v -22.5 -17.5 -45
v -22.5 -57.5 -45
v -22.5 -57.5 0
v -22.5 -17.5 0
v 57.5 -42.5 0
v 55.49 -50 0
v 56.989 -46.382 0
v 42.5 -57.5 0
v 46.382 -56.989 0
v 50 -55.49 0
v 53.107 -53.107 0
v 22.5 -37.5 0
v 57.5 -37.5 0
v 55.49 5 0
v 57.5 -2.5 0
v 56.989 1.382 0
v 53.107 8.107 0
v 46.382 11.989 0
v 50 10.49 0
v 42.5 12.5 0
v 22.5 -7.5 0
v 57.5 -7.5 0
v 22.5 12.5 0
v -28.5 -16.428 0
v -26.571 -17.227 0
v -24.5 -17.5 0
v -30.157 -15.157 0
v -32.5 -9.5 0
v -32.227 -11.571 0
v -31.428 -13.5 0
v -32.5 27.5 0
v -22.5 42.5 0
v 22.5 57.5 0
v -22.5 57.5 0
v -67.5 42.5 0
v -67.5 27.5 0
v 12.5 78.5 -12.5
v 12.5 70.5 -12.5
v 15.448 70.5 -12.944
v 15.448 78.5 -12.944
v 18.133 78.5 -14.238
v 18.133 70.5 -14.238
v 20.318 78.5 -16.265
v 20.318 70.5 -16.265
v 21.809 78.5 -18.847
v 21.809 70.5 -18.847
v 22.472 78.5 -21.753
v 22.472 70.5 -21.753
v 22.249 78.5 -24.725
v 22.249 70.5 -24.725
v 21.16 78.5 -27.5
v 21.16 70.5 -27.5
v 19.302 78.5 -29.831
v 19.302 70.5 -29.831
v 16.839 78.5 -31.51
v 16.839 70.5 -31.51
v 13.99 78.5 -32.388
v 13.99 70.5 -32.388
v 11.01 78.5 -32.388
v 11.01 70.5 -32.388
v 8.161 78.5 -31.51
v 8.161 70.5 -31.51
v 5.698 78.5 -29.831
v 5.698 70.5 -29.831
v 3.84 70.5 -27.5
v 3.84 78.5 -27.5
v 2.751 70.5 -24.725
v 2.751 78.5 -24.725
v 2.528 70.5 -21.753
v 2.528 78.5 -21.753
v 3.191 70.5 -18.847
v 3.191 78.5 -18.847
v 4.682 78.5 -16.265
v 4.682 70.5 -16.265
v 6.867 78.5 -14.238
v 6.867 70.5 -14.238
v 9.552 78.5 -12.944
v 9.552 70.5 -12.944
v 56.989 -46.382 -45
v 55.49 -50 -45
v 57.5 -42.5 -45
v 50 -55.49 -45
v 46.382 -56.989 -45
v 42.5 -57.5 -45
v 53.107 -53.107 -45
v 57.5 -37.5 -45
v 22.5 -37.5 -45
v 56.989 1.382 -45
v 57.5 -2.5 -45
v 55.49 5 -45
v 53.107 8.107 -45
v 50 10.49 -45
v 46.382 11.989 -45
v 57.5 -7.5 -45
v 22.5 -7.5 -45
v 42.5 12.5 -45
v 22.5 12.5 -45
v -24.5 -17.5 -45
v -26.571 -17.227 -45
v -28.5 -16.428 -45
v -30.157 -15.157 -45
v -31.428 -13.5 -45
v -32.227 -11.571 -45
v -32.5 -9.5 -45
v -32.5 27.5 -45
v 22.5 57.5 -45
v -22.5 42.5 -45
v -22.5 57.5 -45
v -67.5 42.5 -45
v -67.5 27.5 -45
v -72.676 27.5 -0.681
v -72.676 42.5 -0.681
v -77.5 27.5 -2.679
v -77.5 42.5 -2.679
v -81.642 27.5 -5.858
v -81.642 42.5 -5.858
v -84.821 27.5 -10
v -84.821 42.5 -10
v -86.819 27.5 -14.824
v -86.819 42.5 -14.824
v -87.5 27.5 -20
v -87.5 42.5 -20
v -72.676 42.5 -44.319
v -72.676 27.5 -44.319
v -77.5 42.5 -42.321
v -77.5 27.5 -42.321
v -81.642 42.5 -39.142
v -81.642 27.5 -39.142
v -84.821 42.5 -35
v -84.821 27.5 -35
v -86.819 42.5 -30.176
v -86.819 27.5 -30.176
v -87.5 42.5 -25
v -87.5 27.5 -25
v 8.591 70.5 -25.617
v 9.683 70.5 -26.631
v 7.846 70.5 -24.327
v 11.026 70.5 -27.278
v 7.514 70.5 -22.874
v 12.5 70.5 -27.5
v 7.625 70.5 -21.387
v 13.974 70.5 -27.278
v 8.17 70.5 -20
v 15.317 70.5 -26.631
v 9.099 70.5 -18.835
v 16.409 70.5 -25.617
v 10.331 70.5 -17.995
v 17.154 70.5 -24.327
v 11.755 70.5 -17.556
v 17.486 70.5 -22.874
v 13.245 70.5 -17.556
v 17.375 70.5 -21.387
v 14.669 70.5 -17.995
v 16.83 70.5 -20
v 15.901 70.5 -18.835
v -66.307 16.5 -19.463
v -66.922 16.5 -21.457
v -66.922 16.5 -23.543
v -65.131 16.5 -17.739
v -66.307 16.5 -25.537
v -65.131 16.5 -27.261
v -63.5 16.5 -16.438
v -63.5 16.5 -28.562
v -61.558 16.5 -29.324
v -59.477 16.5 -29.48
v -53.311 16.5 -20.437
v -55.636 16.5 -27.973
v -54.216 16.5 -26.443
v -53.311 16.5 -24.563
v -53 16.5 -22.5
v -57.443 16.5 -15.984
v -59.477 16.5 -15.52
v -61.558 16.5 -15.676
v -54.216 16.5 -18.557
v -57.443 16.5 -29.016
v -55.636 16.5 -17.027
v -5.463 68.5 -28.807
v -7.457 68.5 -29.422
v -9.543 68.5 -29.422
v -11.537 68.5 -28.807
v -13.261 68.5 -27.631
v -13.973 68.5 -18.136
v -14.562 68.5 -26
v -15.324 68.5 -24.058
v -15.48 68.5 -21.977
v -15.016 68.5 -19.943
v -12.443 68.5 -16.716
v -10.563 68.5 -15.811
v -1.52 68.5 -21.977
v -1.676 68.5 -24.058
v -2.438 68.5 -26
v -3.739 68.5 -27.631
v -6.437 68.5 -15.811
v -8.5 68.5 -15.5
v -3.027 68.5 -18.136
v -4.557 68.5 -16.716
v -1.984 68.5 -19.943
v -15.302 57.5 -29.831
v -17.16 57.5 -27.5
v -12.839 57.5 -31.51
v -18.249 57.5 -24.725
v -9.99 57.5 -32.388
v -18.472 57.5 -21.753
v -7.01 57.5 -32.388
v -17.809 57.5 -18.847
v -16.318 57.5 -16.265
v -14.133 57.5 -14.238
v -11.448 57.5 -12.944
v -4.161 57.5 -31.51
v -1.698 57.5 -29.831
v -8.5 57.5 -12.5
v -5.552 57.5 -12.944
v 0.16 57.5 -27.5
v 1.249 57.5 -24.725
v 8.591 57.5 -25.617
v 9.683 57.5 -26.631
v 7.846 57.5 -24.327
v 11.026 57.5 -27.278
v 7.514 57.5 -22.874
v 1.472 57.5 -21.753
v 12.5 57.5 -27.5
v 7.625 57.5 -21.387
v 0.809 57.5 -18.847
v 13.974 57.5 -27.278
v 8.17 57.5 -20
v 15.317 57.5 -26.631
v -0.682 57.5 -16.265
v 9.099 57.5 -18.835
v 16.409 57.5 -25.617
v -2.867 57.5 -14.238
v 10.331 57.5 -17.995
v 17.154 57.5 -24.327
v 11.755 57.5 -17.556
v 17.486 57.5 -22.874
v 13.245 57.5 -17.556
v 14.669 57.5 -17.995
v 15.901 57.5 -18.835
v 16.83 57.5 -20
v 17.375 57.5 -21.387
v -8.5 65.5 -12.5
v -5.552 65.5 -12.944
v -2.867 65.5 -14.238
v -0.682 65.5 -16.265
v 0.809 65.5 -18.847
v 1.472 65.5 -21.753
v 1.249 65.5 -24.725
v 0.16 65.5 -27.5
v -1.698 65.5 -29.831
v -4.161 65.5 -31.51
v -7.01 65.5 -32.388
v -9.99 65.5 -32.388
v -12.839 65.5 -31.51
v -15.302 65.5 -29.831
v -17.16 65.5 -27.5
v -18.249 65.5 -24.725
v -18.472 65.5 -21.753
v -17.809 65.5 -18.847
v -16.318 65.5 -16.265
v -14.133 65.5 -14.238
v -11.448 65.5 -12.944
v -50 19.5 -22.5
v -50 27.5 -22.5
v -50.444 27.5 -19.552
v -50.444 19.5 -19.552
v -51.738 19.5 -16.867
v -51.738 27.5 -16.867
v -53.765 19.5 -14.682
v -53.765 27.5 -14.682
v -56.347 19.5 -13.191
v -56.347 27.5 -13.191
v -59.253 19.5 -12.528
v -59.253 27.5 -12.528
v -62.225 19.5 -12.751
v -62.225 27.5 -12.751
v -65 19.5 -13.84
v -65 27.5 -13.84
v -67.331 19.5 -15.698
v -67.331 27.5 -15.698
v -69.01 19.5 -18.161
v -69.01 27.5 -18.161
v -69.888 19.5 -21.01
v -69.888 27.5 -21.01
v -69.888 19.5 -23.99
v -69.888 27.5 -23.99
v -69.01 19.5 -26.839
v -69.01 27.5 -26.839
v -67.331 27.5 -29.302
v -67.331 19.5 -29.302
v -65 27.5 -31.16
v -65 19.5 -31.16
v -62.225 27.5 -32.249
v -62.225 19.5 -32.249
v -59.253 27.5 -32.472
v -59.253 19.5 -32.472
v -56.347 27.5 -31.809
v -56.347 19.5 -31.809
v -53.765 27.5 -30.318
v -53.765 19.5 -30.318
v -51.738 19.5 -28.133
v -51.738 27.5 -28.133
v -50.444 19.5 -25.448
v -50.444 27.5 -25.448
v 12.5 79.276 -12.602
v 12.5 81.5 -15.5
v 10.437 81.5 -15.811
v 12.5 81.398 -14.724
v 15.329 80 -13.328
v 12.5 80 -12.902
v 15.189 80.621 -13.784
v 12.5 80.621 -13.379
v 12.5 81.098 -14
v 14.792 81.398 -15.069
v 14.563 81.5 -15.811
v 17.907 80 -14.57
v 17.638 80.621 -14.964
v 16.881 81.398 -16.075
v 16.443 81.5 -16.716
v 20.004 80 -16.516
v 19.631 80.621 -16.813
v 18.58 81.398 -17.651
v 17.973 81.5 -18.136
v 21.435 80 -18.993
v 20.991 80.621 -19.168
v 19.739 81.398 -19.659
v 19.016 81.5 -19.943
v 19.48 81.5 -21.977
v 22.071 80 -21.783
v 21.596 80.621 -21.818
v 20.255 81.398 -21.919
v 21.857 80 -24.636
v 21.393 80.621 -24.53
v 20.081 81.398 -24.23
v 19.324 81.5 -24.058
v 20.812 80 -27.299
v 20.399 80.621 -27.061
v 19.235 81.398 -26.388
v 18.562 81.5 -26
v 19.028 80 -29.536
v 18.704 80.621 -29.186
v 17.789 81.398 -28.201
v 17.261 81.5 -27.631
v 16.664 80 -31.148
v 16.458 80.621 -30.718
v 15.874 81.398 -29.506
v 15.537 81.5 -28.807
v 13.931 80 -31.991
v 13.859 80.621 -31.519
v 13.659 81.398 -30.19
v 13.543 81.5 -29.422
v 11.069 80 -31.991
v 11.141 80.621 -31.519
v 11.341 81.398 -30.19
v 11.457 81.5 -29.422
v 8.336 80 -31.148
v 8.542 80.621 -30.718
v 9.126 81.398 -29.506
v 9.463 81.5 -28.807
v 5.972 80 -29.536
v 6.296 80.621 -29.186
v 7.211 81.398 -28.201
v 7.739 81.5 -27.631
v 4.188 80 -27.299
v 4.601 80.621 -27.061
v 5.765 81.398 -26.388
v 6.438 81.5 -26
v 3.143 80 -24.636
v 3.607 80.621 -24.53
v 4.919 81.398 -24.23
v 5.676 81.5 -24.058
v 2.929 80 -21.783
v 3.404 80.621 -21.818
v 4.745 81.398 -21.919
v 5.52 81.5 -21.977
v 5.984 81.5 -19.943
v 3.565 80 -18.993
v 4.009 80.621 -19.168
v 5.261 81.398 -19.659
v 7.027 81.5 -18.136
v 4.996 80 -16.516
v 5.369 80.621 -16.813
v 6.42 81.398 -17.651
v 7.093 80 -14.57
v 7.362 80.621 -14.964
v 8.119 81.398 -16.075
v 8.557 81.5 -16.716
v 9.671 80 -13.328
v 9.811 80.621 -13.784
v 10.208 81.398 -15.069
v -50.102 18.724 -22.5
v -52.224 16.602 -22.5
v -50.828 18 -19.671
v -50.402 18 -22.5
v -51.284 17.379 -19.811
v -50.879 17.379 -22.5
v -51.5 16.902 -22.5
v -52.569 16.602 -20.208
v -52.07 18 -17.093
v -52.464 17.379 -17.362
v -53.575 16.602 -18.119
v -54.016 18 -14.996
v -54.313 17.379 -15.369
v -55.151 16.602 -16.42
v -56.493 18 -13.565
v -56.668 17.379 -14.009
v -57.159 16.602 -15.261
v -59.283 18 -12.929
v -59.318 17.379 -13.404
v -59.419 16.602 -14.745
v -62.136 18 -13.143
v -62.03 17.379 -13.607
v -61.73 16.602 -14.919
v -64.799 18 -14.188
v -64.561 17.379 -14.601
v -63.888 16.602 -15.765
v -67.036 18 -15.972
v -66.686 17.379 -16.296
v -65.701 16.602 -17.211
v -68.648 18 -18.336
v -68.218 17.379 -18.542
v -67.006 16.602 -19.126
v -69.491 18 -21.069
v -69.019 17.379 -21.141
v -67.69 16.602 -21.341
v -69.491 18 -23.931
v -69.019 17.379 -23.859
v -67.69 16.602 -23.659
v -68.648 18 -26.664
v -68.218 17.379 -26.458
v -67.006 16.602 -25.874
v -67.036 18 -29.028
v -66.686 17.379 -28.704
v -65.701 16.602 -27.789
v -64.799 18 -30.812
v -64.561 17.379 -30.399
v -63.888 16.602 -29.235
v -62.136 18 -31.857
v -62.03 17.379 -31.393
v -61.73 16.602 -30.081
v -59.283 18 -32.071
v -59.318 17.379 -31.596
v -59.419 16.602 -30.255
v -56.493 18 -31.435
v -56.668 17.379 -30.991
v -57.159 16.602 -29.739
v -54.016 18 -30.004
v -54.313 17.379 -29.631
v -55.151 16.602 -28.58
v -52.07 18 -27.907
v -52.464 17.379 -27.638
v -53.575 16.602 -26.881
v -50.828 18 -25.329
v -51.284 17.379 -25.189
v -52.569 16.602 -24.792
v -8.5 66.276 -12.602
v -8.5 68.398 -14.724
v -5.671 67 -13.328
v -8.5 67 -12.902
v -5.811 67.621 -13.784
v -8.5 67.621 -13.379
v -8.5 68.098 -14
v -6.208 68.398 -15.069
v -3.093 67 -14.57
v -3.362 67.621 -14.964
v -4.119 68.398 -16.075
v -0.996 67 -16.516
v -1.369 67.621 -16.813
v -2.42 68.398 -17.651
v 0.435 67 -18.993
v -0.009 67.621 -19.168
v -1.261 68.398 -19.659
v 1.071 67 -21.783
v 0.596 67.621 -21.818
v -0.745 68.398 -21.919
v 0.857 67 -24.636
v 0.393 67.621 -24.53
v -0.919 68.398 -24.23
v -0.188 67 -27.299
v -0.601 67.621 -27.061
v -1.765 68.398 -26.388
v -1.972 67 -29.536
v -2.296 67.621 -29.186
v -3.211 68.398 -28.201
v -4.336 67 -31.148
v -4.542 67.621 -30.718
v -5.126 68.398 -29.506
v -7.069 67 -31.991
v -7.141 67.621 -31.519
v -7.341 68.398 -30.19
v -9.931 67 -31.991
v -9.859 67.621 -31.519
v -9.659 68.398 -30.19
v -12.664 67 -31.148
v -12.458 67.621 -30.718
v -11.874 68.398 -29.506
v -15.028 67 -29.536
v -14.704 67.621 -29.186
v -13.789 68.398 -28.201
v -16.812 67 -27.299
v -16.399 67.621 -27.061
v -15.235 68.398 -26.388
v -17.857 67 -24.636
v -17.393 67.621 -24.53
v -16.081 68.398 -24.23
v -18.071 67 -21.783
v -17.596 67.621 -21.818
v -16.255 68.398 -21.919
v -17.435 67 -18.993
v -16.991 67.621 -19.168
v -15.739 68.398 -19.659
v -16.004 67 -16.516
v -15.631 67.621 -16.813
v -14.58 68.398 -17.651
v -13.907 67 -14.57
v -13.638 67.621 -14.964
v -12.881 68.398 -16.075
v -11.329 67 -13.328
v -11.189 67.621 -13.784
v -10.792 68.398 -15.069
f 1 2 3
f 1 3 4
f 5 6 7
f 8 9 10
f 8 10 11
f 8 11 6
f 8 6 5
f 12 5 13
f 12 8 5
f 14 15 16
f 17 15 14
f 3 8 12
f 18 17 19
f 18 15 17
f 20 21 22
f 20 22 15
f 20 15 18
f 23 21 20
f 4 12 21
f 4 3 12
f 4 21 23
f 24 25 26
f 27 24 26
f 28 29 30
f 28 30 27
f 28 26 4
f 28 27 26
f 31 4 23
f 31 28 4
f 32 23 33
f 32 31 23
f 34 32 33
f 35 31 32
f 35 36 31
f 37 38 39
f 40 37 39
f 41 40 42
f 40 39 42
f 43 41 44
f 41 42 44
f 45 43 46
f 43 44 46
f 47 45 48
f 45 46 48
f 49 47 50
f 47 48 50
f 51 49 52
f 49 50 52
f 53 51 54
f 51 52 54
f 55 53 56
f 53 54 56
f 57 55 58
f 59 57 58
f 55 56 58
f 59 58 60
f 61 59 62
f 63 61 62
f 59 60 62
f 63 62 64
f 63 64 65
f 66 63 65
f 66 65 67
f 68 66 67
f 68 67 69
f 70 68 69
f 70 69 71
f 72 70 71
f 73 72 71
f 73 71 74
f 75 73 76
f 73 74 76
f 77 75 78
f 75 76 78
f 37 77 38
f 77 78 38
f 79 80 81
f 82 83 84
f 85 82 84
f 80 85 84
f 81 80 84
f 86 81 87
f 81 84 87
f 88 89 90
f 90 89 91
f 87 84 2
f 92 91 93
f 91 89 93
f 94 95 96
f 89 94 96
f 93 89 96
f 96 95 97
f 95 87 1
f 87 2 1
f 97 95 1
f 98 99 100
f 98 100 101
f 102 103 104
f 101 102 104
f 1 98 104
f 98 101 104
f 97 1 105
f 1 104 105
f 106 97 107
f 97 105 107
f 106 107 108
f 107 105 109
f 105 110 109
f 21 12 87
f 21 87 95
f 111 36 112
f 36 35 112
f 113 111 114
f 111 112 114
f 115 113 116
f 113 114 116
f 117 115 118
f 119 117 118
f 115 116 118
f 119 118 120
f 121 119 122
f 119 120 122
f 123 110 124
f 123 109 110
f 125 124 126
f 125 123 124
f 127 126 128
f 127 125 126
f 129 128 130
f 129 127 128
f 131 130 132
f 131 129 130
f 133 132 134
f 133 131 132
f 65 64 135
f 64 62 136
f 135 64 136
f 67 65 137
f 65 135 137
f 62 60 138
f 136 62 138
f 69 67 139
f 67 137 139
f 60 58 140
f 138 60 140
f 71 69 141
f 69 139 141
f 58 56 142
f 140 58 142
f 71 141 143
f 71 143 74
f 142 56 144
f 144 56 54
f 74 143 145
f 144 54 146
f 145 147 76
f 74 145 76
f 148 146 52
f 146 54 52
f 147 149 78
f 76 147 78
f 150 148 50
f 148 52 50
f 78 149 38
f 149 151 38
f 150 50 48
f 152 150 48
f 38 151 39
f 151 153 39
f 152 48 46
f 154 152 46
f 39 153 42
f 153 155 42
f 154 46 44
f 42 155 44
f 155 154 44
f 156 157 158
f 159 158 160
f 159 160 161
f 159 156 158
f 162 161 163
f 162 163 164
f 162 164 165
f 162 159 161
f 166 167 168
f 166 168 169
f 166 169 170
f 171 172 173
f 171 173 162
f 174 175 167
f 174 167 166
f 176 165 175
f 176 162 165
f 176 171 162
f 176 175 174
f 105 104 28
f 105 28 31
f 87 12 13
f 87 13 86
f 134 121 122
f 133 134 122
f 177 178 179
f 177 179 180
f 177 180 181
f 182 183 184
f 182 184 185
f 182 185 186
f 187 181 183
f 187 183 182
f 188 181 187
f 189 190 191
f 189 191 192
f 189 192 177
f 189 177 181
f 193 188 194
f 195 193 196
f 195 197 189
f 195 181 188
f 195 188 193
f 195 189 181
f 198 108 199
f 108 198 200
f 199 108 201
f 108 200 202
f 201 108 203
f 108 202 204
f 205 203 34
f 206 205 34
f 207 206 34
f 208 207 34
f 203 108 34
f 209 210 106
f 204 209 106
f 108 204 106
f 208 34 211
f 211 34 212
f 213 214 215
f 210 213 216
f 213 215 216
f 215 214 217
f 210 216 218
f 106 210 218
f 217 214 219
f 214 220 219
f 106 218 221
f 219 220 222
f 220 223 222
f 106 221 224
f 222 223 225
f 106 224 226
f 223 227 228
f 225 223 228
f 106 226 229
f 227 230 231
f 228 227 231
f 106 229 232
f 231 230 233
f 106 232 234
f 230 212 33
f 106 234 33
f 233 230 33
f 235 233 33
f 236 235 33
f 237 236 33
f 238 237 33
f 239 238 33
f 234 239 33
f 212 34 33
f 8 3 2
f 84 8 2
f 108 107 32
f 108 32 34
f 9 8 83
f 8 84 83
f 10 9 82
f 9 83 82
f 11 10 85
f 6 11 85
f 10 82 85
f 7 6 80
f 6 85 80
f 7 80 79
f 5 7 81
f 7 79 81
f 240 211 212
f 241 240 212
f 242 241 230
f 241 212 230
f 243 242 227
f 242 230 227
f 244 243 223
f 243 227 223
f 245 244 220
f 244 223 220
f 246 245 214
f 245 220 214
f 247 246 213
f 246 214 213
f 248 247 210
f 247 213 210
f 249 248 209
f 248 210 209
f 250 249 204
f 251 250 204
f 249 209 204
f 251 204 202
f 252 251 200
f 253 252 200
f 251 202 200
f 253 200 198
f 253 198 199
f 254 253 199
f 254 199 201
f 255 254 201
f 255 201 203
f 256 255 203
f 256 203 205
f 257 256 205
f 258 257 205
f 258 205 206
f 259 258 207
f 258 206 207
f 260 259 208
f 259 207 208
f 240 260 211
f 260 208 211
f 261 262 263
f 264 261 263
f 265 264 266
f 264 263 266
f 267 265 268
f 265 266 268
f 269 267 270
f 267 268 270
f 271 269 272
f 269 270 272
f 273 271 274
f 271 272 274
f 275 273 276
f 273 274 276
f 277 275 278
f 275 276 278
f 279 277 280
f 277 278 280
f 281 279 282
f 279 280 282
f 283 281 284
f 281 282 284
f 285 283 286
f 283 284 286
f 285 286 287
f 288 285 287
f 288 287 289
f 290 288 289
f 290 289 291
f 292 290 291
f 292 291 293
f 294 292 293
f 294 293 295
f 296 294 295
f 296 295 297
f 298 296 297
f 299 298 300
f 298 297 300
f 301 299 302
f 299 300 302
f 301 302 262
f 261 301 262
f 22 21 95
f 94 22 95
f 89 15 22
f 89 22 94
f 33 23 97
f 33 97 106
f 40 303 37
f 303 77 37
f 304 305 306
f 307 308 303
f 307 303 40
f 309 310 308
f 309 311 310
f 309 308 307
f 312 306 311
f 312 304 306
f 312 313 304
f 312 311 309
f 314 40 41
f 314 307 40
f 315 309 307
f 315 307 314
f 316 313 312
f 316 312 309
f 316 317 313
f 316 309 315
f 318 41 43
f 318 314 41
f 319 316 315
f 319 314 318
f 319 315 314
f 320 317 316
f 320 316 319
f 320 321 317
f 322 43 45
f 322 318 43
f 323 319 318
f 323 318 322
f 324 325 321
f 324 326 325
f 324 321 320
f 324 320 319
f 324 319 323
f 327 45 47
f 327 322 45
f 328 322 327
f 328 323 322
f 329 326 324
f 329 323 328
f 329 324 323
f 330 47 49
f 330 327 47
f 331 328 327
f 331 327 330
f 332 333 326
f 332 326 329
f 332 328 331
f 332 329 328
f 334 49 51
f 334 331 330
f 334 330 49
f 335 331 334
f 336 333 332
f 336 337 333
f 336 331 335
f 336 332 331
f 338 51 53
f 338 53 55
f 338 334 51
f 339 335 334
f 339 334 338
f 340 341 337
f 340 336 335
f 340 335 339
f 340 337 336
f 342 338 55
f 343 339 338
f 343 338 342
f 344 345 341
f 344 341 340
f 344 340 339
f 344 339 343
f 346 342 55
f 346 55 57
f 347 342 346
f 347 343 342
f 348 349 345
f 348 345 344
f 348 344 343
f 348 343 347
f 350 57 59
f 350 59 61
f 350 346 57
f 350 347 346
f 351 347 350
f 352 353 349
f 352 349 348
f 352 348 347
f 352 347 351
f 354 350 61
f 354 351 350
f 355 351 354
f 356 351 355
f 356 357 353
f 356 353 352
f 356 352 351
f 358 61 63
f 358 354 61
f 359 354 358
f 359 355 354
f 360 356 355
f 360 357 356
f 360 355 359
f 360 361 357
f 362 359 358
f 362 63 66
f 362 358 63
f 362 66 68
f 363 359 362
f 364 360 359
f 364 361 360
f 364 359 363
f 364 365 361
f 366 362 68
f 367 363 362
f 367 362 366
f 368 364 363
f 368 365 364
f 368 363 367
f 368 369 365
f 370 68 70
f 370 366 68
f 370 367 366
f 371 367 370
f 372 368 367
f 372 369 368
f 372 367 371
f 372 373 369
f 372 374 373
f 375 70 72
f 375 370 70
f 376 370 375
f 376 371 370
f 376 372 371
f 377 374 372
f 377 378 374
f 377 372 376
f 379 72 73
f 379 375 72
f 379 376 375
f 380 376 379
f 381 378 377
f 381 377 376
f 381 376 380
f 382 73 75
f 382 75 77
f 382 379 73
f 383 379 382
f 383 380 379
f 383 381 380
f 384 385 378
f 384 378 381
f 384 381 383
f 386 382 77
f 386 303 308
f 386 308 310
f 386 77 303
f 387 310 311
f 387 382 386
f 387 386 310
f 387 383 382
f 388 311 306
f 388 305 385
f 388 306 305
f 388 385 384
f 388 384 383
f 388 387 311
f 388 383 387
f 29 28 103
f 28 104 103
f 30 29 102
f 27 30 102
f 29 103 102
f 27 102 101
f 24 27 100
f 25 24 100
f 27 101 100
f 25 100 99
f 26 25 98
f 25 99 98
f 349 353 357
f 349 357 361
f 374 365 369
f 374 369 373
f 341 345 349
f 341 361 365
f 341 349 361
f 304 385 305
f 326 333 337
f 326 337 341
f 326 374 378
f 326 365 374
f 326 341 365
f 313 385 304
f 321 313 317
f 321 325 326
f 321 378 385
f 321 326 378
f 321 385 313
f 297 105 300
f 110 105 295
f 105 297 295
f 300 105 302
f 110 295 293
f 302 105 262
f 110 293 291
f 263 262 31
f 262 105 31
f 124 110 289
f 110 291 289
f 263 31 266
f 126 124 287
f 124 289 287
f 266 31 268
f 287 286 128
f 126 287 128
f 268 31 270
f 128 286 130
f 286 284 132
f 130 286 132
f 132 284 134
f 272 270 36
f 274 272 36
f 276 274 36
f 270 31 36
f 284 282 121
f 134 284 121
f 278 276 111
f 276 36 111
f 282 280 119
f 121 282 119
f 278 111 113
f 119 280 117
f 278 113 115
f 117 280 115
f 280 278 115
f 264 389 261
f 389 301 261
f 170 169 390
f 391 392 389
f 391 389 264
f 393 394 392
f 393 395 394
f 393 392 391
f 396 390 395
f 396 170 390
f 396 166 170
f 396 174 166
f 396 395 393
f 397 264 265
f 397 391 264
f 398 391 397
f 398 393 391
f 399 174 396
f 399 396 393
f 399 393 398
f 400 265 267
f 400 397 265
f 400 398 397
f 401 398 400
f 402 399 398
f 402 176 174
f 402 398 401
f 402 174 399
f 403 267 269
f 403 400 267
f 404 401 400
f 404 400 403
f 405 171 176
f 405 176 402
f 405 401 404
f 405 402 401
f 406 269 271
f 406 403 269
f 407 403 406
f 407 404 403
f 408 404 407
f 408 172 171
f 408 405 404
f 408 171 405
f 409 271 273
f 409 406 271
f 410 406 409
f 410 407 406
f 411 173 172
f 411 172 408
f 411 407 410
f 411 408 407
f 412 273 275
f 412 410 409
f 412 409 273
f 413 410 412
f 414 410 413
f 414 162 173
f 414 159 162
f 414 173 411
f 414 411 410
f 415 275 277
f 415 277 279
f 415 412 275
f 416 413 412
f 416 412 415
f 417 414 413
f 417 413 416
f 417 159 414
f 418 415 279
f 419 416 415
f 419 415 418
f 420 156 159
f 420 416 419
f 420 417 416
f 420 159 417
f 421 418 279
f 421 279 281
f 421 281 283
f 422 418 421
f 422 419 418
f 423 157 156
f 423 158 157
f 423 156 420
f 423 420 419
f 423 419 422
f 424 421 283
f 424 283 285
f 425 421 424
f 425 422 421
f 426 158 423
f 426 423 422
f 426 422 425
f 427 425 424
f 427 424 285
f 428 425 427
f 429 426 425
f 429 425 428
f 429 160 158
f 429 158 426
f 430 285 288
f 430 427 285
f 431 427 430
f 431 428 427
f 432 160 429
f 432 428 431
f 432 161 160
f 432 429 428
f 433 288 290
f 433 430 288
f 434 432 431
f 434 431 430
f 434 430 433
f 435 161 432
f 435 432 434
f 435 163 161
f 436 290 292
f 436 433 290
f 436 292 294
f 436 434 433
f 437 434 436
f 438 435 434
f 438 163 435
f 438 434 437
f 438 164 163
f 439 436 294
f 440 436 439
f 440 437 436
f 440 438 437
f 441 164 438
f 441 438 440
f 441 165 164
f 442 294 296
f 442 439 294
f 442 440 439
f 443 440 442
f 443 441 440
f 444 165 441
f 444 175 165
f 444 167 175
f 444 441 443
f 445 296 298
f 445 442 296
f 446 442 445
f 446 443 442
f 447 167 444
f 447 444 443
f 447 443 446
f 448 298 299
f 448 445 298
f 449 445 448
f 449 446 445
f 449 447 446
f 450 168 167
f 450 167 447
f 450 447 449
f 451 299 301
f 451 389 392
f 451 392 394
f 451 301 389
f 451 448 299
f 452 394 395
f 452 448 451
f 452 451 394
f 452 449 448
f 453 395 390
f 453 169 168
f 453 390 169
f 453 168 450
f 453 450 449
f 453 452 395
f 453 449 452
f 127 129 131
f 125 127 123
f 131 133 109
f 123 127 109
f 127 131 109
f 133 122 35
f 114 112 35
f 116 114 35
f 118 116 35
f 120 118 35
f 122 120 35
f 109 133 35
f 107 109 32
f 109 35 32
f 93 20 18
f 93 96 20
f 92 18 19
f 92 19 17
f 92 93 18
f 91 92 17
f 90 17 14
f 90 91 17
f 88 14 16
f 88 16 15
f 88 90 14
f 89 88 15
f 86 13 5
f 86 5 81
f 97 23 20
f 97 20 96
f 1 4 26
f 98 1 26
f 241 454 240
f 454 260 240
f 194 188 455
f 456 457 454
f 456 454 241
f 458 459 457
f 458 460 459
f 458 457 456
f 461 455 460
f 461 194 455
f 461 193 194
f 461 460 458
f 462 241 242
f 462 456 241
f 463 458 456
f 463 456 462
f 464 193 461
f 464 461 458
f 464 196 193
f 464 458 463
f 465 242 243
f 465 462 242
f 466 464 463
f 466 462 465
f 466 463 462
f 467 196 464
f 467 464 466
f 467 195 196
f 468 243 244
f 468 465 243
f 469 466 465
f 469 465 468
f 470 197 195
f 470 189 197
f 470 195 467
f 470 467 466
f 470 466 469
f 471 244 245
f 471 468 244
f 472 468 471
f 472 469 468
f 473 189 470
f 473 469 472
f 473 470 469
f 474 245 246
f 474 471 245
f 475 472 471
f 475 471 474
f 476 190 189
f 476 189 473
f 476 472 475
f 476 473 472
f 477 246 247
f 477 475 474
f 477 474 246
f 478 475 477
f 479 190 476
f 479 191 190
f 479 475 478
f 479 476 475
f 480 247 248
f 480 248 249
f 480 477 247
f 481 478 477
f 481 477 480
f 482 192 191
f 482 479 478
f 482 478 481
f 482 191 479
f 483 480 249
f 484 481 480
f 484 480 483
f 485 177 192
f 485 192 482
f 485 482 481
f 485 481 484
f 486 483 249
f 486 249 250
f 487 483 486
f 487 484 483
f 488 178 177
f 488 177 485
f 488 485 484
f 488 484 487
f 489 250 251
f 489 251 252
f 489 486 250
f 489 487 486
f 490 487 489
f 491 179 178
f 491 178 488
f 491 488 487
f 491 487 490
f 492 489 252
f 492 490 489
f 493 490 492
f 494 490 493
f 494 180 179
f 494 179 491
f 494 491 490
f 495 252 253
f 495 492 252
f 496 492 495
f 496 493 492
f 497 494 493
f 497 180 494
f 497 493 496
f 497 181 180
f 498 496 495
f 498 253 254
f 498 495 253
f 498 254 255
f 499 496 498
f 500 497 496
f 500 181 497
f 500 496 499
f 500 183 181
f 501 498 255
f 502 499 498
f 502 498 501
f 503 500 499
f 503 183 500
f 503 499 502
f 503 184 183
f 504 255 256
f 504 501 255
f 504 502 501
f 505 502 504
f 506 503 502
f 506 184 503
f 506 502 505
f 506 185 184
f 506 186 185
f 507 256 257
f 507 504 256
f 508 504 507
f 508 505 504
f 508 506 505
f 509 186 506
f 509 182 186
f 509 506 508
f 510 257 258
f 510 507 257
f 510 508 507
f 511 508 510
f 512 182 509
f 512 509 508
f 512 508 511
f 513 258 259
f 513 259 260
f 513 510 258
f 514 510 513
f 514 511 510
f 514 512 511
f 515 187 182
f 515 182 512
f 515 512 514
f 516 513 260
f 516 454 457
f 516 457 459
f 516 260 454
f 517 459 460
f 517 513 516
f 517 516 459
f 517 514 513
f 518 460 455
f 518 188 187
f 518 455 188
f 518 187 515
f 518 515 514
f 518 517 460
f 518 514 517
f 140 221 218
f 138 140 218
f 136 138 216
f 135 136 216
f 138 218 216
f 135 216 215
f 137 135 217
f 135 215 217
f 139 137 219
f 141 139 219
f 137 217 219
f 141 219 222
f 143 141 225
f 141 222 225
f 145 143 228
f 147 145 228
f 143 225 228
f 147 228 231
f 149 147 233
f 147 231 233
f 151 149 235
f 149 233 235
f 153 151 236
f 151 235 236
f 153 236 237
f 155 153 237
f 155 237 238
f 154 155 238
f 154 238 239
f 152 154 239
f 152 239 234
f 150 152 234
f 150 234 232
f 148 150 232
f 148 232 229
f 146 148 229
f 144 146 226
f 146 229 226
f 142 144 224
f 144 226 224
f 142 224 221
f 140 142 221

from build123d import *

# Parameters (mm, degrees)
SKETCH1_W           = 45
SKETCH1_H           = 115
BOSS_EXTRUDE1_DEPTH = 45
SKETCH2_W           = 45
SKETCH2_H           = 20
BOSS_EXTRUDE2_DEPTH = 35
BOSS_EXTRUDE3_DEPTH = 45
SKETCH4_R           = 10
BOSS_EXTRUDE4_DEPTH = 11
SKETCH4_3_R         = 5
BOSS_EXTRUDE5_DEPTH = 13
SKETCH6_R           = 10
BOSS_EXTRUDE6_DEPTH = 11
SKETCH7_R           = 10
BOSS_EXTRUDE7_DEPTH = 11
FILLET1_R           = 20
FILLET2_R           = 8
FILLET3_R           = 15
FILLET4_R           = 3


with BuildPart() as part:
    # Sketch1 → Boss-Extrude1 (new body)
    with BuildSketch(Plane.XY):
        Rectangle(SKETCH1_W, SKETCH1_H)
    extrude(amount=-BOSS_EXTRUDE1_DEPTH)

    # Sketch2 → Boss-Extrude2 (add)
    with BuildSketch(Plane(origin=(22.5, 0, 0), x_dir=(0, 0, -1), z_dir=(1, 0, 0))):
        with Locations((22.5, -47.5)):
            Rectangle(SKETCH2_W, SKETCH2_H)
        with Locations((22.5, 2.5)):
            Rectangle(SKETCH2_W, SKETCH2_H)
    extrude(amount=BOSS_EXTRUDE2_DEPTH)

    # Sketch3 → Boss-Extrude3 (add)
    with BuildSketch(Plane.XY):
        Polygon((-22.5, -17.5), (-32.5, -17.5), (-32.5, 27.5), (-87.5, 27.5), (-87.5, 42.5), (-22.5, 42.5), align=None)
    extrude(amount=-BOSS_EXTRUDE3_DEPTH)

    # Sketch4 → Boss-Extrude4 (add)
    with BuildSketch(Plane(origin=(0, 57.5, 0), x_dir=(1, 0, 0), z_dir=(0, 1, 0))):
        with Locations(Location((-8.5, 22.5, 0), (0, 0, 270))):
            Circle(SKETCH4_R)
    extrude(amount=BOSS_EXTRUDE4_DEPTH)

    # Sketch4<3> → Boss-Extrude5 (add)
    with BuildSketch(Plane(origin=(0, 57.5, 0), x_dir=(1, 0, 0), z_dir=(0, 1, 0))):
        with Locations(Location((12.5, 22.5, 0), (0, 0, 90))):
            Circle(SKETCH4_3_R)
    extrude(amount=BOSS_EXTRUDE5_DEPTH)

    # Sketch6 → Boss-Extrude6 (add)
    with BuildSketch(Plane(origin=(0, 70.5, 0), x_dir=(1, 0, 0), z_dir=(0, 1, 0))):
        with Locations(Location((12.5, 22.5, 0), (0, 0, 270))):
            Circle(SKETCH6_R)
    extrude(amount=BOSS_EXTRUDE6_DEPTH)

    # Sketch7 → Boss-Extrude7 (add)
    with BuildSketch(Plane.XZ.offset(-27.5)):
        with Locations((-60, -22.5)):
            Circle(SKETCH7_R)
    extrude(amount=BOSS_EXTRUDE7_DEPTH)

    # Fillet1
    fillet1_edges = [part.edges().sort_by_distance(p)[0] for p in [
        (-87.5, 35, 0),
        (-87.5, 35, -45),
    ]]
    fillet(fillet1_edges, radius=FILLET1_R)

    # Fillet2
    fillet2_edges = [part.edges().sort_by_distance(p)[0] for p in [
        (-32.5, -17.5, -22.5),
    ]]
    fillet(fillet2_edges, radius=FILLET2_R)

    # Fillet3
    fillet3_edges = [part.edges().sort_by_distance(p)[0] for p in [
        (57.5, -57.5, -22.5),
        (57.5, 12.5, -22.5),
    ]]
    fillet(fillet3_edges, radius=FILLET3_R)

    # Fillet4
    fillet4_edges = [part.edges().sort_by_distance(p)[0] for p in [
        (-8.5, 68.5, -32.5),
        (12.5, 81.5, -32.5),
        (-70, 16.5, -22.5),
    ]]
    fillet(fillet4_edges, radius=FILLET4_R)


solid = part.part
